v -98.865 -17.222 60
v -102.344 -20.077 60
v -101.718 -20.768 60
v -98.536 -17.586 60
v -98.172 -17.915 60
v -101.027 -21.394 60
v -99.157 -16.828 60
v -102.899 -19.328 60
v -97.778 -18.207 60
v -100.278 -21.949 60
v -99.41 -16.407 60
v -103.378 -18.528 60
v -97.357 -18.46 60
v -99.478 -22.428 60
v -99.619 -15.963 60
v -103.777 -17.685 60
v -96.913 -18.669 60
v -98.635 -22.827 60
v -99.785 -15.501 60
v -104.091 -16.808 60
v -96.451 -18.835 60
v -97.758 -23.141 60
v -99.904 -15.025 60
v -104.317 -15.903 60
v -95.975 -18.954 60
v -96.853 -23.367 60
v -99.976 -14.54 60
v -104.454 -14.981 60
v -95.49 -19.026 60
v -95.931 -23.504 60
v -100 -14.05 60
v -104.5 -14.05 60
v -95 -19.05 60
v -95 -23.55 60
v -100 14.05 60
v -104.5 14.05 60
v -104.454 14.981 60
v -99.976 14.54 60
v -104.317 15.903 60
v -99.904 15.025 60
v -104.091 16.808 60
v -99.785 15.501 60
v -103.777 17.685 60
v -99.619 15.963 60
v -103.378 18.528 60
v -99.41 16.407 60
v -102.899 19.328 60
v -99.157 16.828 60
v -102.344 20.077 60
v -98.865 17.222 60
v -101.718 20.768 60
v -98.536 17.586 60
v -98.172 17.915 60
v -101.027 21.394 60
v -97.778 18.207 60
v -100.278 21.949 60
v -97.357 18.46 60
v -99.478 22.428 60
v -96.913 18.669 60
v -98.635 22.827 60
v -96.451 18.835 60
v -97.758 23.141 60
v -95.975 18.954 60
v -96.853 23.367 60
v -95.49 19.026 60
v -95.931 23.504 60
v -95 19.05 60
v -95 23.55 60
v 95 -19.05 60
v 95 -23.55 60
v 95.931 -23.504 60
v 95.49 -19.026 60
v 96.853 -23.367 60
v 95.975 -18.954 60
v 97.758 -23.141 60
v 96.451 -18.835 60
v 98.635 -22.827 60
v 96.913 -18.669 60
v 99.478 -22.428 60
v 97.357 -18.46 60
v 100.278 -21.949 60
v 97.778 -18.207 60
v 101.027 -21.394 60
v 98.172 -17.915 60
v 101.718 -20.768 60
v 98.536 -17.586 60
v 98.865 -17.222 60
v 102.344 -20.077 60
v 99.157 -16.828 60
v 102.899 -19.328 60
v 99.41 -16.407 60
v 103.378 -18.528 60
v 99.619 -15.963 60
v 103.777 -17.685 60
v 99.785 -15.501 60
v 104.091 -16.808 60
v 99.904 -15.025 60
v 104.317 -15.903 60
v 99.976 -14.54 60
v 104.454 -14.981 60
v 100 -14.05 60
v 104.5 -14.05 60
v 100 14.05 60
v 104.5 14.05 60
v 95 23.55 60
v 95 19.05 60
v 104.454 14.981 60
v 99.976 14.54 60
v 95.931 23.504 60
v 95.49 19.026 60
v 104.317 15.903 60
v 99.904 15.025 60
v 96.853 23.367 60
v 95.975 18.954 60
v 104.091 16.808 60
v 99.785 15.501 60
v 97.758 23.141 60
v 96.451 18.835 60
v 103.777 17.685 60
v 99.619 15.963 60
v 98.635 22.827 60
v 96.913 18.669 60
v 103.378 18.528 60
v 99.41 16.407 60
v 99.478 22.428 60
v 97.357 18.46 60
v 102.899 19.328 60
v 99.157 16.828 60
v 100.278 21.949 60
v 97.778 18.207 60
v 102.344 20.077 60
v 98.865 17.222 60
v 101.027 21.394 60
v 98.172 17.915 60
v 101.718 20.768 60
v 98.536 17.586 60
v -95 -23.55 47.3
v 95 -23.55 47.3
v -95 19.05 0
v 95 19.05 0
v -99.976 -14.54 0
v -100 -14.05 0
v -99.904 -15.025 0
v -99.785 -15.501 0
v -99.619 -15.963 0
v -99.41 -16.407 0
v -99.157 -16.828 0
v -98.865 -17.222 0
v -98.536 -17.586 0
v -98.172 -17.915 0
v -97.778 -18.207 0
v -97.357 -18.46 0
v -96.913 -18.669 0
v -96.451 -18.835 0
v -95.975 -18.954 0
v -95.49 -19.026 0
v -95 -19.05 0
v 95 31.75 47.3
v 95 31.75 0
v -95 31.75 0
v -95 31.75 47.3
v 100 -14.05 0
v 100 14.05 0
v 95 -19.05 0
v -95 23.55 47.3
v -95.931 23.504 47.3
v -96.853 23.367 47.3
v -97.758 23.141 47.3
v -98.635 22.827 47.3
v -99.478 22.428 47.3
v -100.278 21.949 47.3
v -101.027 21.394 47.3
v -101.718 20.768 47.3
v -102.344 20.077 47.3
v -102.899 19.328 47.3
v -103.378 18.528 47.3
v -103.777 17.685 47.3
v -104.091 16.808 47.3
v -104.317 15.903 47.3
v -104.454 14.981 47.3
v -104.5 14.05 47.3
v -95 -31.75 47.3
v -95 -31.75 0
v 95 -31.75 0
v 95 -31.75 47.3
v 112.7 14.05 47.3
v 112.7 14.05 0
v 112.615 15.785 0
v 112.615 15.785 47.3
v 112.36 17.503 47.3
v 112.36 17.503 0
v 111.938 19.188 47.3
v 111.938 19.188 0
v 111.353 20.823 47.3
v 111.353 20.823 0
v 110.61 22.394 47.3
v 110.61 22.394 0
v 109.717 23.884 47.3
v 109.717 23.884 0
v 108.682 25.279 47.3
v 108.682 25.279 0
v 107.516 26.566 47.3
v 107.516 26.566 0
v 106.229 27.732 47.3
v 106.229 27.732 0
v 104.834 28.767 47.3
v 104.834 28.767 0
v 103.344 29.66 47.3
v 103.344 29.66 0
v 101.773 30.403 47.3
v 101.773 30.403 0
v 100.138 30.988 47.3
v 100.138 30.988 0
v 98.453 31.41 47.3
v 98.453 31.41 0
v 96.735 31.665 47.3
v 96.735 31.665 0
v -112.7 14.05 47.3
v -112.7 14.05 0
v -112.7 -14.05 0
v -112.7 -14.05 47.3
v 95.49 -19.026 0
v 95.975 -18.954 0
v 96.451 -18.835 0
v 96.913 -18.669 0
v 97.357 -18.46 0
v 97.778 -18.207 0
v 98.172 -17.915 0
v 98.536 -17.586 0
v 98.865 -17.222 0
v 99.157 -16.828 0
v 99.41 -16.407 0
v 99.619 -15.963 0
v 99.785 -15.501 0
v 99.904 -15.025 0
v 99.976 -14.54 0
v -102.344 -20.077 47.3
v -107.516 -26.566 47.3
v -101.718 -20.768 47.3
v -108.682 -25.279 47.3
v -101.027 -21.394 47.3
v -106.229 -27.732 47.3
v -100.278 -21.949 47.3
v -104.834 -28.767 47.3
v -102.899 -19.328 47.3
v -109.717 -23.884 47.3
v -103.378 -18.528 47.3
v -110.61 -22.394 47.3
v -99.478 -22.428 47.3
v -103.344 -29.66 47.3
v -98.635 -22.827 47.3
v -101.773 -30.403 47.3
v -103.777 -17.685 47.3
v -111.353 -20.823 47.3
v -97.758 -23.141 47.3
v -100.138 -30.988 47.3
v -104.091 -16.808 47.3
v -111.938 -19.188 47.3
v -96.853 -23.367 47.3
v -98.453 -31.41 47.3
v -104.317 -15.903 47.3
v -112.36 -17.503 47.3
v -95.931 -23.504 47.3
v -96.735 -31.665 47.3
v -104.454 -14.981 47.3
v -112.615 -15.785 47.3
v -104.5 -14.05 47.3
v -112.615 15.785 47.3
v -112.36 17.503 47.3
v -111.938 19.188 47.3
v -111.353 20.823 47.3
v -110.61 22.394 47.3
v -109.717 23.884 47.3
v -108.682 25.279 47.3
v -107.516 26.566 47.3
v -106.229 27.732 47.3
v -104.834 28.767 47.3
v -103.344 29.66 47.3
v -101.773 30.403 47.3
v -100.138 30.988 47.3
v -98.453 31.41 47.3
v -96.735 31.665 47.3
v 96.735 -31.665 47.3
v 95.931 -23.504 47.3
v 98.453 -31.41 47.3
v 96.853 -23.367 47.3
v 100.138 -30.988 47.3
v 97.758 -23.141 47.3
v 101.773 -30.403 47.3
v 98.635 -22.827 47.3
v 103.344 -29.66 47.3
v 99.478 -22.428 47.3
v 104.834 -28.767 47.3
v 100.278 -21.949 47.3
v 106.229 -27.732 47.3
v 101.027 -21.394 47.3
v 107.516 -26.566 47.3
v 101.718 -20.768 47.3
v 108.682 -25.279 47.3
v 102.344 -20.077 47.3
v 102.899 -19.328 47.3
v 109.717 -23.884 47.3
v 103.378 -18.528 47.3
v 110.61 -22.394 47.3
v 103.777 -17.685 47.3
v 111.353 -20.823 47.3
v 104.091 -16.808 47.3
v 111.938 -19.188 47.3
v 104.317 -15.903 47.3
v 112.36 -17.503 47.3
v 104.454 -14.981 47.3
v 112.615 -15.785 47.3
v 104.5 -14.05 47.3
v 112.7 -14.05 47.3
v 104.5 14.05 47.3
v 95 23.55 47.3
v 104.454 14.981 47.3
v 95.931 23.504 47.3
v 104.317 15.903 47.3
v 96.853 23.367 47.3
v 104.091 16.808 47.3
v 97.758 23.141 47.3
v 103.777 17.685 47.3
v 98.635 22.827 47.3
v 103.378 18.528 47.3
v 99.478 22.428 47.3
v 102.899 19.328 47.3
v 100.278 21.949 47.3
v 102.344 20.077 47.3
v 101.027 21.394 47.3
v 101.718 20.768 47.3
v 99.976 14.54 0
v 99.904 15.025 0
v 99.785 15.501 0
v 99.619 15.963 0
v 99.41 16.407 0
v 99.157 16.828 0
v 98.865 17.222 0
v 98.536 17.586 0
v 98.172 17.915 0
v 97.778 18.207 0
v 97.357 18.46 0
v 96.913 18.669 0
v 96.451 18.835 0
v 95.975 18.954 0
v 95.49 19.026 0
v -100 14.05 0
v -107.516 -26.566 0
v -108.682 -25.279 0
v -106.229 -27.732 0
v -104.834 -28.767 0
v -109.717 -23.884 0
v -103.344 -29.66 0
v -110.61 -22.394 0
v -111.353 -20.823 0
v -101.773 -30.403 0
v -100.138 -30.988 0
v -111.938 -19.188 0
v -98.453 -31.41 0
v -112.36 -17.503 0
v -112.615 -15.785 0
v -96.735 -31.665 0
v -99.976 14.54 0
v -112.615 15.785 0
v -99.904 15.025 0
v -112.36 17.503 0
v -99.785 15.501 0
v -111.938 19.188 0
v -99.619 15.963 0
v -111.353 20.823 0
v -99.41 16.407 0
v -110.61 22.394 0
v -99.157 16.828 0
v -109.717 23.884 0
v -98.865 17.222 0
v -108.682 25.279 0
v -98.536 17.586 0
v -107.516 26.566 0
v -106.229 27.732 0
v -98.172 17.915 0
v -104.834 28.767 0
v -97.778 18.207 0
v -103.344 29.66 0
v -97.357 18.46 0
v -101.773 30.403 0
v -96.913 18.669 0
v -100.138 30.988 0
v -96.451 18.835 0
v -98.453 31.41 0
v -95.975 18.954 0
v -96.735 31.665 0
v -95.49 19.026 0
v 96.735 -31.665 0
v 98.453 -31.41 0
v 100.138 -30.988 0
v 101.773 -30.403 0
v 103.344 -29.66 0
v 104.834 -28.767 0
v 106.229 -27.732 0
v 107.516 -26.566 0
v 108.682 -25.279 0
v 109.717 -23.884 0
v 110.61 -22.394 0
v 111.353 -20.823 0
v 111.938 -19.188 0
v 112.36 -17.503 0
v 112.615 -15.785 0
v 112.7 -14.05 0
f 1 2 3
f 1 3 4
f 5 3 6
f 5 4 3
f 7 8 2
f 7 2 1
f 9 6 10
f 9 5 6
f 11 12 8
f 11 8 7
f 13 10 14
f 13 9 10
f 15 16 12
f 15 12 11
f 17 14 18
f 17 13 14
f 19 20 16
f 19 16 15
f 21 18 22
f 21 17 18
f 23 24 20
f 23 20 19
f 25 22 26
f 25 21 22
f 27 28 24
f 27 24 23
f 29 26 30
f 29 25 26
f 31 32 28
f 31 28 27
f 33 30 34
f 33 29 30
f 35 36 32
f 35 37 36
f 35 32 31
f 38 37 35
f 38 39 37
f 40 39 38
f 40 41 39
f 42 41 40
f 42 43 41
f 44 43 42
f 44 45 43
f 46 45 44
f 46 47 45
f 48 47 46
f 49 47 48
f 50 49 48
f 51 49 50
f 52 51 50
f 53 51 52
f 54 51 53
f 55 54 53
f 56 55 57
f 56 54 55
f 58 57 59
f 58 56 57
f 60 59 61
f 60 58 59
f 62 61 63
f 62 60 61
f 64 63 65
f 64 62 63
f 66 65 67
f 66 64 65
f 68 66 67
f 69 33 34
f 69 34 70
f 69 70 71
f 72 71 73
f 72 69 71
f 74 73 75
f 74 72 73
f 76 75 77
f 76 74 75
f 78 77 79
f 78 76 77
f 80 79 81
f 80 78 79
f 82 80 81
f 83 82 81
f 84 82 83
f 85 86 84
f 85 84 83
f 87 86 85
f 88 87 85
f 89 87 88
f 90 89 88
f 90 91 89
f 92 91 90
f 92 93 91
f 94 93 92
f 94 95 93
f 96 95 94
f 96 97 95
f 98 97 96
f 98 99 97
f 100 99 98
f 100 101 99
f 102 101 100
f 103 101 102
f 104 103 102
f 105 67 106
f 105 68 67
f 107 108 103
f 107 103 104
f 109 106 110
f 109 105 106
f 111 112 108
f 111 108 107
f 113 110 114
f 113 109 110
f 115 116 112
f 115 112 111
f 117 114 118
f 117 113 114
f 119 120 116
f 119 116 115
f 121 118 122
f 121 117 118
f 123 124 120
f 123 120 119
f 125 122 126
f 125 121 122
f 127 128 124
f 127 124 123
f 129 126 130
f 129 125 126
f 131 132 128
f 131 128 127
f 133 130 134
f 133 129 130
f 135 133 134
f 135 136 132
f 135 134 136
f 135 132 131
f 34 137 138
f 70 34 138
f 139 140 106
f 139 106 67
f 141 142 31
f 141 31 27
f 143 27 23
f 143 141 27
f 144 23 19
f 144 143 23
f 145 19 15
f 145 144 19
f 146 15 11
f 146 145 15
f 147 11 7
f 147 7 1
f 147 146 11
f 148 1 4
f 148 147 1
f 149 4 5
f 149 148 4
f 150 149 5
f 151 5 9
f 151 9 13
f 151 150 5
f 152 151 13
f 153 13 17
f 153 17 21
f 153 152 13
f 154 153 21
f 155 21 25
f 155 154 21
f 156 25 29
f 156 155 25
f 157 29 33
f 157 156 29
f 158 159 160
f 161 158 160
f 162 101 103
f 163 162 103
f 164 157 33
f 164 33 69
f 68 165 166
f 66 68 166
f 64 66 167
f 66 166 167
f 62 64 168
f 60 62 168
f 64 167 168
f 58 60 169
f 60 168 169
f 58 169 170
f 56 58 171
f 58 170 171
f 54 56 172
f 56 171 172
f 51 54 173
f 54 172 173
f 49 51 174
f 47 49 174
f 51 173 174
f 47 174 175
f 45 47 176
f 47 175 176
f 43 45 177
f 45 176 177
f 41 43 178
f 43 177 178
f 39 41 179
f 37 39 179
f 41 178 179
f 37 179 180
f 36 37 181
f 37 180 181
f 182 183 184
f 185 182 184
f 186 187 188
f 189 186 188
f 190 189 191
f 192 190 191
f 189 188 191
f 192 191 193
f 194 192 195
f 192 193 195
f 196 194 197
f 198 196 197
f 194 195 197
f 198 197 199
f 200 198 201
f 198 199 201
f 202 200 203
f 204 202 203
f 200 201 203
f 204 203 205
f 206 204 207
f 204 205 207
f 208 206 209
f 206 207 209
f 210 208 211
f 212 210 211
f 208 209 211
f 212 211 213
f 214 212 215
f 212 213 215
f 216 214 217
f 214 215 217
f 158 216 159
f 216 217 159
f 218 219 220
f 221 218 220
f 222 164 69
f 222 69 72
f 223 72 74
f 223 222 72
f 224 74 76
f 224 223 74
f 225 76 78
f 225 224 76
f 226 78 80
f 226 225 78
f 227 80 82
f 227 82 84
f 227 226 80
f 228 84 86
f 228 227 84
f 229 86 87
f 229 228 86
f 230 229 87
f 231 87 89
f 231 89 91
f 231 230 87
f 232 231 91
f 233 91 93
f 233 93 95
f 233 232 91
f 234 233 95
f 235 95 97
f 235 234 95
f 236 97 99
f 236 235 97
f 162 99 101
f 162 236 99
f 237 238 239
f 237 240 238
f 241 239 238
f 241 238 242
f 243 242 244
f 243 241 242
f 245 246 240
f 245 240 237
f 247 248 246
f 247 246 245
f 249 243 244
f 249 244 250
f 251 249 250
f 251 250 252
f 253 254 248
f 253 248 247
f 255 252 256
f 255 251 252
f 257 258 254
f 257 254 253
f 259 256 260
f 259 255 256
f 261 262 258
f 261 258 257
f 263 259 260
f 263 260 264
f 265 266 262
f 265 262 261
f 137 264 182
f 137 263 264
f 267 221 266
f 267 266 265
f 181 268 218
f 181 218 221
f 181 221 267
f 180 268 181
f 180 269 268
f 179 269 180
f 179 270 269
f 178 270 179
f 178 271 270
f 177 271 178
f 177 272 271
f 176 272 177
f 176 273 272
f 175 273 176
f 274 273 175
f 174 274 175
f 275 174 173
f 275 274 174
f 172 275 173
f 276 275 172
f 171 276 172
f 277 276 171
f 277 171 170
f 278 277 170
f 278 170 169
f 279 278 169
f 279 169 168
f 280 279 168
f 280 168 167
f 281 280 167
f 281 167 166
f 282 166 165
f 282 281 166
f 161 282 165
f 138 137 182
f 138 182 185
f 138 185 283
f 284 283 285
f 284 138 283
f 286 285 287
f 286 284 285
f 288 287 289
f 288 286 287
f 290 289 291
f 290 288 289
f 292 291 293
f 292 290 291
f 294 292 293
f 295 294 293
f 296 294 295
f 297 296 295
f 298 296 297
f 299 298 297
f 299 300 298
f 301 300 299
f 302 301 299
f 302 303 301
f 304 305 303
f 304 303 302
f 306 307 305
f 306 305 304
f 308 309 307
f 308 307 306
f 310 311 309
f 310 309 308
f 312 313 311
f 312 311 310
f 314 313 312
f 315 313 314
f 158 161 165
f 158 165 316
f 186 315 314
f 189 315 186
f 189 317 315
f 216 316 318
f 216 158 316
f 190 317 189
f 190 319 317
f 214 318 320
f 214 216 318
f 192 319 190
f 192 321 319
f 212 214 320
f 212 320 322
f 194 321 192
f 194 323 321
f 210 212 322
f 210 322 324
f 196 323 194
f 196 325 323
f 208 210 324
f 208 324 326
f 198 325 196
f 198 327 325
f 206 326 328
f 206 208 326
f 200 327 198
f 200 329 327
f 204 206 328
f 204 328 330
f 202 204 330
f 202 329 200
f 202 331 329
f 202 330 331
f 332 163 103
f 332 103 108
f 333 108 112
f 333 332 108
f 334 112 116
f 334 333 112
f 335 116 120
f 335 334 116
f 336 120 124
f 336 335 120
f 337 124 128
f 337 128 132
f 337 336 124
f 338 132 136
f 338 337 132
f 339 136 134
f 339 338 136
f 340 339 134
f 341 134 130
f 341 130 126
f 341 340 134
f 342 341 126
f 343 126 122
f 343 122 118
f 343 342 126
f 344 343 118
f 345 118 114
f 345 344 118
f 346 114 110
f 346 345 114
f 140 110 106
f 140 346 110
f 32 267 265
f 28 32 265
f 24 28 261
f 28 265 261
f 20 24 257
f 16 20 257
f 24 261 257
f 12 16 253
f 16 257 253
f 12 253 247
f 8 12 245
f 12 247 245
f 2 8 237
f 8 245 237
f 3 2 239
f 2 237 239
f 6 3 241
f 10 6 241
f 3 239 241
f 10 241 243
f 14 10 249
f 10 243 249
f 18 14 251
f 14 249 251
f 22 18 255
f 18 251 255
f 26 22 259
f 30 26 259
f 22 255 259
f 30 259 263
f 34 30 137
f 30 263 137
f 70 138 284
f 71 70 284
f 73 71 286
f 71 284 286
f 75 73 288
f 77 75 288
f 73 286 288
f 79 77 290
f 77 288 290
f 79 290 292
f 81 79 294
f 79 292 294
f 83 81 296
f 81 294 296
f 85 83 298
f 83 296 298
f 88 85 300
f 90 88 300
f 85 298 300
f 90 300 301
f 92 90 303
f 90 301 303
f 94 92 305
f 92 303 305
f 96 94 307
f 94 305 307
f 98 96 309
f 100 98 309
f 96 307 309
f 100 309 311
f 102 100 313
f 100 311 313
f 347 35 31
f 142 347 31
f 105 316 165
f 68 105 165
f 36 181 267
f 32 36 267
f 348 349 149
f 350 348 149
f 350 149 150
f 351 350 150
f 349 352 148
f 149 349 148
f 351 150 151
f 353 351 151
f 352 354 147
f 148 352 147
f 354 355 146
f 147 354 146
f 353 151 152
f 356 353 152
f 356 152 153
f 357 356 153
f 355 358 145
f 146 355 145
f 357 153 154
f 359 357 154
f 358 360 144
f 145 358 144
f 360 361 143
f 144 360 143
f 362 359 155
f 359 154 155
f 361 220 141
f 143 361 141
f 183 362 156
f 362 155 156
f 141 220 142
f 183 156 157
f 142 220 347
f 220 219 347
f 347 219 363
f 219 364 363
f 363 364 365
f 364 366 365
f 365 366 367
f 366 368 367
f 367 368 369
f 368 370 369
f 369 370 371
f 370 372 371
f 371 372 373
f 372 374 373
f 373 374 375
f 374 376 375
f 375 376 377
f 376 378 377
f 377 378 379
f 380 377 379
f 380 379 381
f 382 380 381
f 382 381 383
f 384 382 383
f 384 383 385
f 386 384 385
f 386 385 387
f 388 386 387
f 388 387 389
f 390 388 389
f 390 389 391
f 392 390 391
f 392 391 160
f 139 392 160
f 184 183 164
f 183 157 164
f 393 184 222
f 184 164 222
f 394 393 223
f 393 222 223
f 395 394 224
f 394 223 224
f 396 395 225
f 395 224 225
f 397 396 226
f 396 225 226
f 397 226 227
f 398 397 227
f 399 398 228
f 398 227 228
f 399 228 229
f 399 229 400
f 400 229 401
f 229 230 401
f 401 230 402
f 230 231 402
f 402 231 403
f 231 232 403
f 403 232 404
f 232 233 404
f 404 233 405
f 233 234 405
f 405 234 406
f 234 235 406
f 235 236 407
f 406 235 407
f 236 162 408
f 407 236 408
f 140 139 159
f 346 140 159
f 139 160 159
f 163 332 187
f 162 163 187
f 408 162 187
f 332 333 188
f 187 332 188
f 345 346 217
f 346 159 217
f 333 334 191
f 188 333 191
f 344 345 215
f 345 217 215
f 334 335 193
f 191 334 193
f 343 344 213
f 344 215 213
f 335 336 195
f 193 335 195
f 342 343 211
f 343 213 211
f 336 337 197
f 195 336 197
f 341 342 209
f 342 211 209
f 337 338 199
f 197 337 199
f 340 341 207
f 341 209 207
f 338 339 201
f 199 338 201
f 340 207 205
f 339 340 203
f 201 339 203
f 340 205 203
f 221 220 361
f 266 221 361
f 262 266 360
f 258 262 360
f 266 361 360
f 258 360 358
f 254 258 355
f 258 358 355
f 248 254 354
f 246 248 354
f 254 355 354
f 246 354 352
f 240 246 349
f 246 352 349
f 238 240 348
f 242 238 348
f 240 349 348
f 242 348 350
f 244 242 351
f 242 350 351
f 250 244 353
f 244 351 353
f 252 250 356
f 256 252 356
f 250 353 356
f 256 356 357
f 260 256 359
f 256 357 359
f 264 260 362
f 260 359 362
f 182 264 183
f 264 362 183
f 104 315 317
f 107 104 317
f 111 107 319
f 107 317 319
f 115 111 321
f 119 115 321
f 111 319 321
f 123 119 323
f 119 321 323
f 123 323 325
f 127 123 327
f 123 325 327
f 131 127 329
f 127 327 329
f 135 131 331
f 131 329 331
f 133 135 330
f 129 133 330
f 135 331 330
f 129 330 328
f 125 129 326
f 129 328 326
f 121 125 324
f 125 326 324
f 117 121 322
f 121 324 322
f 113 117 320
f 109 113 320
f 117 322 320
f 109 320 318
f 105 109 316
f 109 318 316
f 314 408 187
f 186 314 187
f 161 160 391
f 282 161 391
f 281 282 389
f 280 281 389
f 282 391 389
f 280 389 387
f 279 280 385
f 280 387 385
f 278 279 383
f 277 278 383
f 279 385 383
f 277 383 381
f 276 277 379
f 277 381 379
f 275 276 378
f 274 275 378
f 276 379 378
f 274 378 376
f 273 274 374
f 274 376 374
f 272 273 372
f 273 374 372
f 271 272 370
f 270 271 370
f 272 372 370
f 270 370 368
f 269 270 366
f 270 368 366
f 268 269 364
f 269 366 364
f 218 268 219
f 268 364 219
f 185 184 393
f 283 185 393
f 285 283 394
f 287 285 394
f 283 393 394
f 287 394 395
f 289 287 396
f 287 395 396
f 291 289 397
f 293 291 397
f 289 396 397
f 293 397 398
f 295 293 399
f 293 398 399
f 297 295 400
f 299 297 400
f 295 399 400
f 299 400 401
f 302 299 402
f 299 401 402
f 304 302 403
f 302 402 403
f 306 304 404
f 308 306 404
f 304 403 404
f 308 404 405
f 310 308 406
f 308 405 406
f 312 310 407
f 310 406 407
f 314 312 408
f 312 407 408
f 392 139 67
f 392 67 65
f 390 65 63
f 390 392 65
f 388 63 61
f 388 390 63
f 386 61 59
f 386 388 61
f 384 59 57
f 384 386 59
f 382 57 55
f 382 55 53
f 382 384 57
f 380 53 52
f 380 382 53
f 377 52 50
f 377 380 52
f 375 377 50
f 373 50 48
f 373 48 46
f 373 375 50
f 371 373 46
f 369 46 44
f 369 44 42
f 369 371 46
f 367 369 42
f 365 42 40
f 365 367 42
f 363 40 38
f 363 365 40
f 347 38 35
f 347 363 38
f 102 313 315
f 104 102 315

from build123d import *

# Parameters (mm, degrees)
BOSS_EXTRU_1_DEPTH = 47.3
BOSS_EXTRU_2_DEPTH = 12.7


with BuildPart() as part:
    # Esquisse1 → Boss.-Extru.1 (new body)
    with BuildSketch(Plane.XY):
        with BuildLine():
            Line((-95, -31.75), (95, -31.75))
            ThreePointArc((95, -31.75), (107.515790027, -26.565790027), (112.7, -14.05))
            Line((112.7, -14.05), (112.7, 14.05))
            ThreePointArc((112.7, 14.05), (107.515790027, 26.565790027), (95, 31.75))
            Line((95, 31.75), (-95, 31.75))
            ThreePointArc((-95, 31.75), (-107.515790027, 26.565790027), (-112.7, 14.05))
            Line((-112.7, 14.05), (-112.7, -14.05))
            ThreePointArc((-112.7, -14.05), (-107.515790027, -26.565790027), (-95, -31.75))
        make_face()
        with BuildLine():
            Line((-95, -19.05), (95, -19.05))
            ThreePointArc((95, -19.05), (98.535533906, -17.585533906), (100, -14.05))
            Line((100, -14.05), (100, 14.05))
            ThreePointArc((100, 14.05), (98.535533906, 17.585533906), (95, 19.05))
            Line((95, 19.05), (-95, 19.05))
            ThreePointArc((-95, 19.05), (-98.535533906, 17.585533906), (-100, 14.05))
            Line((-100, 14.05), (-100, -14.05))
            ThreePointArc((-100, -14.05), (-98.535533906, -17.585533906), (-95, -19.05))
        make_face(mode=Mode.SUBTRACT)
    extrude(amount=BOSS_EXTRU_1_DEPTH)

    # Esquisse2 → Boss.-Extru.2 (add)
    with BuildSketch(Plane.XY.offset(47.3)):
        with BuildLine():
            Line((-104.5, 14.05), (-104.5, -14.05))
            ThreePointArc((-104.5, -14.05), (-101.717514421, -20.767514421), (-95, -23.55))
            Line((-95, -23.55), (95, -23.55))
            ThreePointArc((95, -23.55), (101.717514421, -20.767514421), (104.5, -14.05))
            Line((104.5, -14.05), (104.5, 14.05))
            ThreePointArc((104.5, 14.05), (101.717514421, 20.767514421), (95, 23.55))
            Line((95, 23.55), (-95, 23.55))
            ThreePointArc((-95, 23.55), (-101.717514421, 20.767514421), (-104.5, 14.05))
        make_face()
        with BuildLine():
            Line((100, -14.05), (100, 14.05))
            ThreePointArc((100, 14.05), (98.535533906, 17.585533906), (95, 19.05))
            Line((95, 19.05), (-95, 19.05))
            ThreePointArc((-95, 19.05), (-98.535533906, 17.585533906), (-100, 14.05))
            Line((-100, 14.05), (-100, -14.05))
            ThreePointArc((-100, -14.05), (-98.535533906, -17.585533906), (-95, -19.05))
            Line((-95, -19.05), (95, -19.05))
            ThreePointArc((95, -19.05), (98.535533906, -17.585533906), (100, -14.05))
        make_face(mode=Mode.SUBTRACT)
    extrude(amount=BOSS_EXTRU_2_DEPTH)


solid = part.part
